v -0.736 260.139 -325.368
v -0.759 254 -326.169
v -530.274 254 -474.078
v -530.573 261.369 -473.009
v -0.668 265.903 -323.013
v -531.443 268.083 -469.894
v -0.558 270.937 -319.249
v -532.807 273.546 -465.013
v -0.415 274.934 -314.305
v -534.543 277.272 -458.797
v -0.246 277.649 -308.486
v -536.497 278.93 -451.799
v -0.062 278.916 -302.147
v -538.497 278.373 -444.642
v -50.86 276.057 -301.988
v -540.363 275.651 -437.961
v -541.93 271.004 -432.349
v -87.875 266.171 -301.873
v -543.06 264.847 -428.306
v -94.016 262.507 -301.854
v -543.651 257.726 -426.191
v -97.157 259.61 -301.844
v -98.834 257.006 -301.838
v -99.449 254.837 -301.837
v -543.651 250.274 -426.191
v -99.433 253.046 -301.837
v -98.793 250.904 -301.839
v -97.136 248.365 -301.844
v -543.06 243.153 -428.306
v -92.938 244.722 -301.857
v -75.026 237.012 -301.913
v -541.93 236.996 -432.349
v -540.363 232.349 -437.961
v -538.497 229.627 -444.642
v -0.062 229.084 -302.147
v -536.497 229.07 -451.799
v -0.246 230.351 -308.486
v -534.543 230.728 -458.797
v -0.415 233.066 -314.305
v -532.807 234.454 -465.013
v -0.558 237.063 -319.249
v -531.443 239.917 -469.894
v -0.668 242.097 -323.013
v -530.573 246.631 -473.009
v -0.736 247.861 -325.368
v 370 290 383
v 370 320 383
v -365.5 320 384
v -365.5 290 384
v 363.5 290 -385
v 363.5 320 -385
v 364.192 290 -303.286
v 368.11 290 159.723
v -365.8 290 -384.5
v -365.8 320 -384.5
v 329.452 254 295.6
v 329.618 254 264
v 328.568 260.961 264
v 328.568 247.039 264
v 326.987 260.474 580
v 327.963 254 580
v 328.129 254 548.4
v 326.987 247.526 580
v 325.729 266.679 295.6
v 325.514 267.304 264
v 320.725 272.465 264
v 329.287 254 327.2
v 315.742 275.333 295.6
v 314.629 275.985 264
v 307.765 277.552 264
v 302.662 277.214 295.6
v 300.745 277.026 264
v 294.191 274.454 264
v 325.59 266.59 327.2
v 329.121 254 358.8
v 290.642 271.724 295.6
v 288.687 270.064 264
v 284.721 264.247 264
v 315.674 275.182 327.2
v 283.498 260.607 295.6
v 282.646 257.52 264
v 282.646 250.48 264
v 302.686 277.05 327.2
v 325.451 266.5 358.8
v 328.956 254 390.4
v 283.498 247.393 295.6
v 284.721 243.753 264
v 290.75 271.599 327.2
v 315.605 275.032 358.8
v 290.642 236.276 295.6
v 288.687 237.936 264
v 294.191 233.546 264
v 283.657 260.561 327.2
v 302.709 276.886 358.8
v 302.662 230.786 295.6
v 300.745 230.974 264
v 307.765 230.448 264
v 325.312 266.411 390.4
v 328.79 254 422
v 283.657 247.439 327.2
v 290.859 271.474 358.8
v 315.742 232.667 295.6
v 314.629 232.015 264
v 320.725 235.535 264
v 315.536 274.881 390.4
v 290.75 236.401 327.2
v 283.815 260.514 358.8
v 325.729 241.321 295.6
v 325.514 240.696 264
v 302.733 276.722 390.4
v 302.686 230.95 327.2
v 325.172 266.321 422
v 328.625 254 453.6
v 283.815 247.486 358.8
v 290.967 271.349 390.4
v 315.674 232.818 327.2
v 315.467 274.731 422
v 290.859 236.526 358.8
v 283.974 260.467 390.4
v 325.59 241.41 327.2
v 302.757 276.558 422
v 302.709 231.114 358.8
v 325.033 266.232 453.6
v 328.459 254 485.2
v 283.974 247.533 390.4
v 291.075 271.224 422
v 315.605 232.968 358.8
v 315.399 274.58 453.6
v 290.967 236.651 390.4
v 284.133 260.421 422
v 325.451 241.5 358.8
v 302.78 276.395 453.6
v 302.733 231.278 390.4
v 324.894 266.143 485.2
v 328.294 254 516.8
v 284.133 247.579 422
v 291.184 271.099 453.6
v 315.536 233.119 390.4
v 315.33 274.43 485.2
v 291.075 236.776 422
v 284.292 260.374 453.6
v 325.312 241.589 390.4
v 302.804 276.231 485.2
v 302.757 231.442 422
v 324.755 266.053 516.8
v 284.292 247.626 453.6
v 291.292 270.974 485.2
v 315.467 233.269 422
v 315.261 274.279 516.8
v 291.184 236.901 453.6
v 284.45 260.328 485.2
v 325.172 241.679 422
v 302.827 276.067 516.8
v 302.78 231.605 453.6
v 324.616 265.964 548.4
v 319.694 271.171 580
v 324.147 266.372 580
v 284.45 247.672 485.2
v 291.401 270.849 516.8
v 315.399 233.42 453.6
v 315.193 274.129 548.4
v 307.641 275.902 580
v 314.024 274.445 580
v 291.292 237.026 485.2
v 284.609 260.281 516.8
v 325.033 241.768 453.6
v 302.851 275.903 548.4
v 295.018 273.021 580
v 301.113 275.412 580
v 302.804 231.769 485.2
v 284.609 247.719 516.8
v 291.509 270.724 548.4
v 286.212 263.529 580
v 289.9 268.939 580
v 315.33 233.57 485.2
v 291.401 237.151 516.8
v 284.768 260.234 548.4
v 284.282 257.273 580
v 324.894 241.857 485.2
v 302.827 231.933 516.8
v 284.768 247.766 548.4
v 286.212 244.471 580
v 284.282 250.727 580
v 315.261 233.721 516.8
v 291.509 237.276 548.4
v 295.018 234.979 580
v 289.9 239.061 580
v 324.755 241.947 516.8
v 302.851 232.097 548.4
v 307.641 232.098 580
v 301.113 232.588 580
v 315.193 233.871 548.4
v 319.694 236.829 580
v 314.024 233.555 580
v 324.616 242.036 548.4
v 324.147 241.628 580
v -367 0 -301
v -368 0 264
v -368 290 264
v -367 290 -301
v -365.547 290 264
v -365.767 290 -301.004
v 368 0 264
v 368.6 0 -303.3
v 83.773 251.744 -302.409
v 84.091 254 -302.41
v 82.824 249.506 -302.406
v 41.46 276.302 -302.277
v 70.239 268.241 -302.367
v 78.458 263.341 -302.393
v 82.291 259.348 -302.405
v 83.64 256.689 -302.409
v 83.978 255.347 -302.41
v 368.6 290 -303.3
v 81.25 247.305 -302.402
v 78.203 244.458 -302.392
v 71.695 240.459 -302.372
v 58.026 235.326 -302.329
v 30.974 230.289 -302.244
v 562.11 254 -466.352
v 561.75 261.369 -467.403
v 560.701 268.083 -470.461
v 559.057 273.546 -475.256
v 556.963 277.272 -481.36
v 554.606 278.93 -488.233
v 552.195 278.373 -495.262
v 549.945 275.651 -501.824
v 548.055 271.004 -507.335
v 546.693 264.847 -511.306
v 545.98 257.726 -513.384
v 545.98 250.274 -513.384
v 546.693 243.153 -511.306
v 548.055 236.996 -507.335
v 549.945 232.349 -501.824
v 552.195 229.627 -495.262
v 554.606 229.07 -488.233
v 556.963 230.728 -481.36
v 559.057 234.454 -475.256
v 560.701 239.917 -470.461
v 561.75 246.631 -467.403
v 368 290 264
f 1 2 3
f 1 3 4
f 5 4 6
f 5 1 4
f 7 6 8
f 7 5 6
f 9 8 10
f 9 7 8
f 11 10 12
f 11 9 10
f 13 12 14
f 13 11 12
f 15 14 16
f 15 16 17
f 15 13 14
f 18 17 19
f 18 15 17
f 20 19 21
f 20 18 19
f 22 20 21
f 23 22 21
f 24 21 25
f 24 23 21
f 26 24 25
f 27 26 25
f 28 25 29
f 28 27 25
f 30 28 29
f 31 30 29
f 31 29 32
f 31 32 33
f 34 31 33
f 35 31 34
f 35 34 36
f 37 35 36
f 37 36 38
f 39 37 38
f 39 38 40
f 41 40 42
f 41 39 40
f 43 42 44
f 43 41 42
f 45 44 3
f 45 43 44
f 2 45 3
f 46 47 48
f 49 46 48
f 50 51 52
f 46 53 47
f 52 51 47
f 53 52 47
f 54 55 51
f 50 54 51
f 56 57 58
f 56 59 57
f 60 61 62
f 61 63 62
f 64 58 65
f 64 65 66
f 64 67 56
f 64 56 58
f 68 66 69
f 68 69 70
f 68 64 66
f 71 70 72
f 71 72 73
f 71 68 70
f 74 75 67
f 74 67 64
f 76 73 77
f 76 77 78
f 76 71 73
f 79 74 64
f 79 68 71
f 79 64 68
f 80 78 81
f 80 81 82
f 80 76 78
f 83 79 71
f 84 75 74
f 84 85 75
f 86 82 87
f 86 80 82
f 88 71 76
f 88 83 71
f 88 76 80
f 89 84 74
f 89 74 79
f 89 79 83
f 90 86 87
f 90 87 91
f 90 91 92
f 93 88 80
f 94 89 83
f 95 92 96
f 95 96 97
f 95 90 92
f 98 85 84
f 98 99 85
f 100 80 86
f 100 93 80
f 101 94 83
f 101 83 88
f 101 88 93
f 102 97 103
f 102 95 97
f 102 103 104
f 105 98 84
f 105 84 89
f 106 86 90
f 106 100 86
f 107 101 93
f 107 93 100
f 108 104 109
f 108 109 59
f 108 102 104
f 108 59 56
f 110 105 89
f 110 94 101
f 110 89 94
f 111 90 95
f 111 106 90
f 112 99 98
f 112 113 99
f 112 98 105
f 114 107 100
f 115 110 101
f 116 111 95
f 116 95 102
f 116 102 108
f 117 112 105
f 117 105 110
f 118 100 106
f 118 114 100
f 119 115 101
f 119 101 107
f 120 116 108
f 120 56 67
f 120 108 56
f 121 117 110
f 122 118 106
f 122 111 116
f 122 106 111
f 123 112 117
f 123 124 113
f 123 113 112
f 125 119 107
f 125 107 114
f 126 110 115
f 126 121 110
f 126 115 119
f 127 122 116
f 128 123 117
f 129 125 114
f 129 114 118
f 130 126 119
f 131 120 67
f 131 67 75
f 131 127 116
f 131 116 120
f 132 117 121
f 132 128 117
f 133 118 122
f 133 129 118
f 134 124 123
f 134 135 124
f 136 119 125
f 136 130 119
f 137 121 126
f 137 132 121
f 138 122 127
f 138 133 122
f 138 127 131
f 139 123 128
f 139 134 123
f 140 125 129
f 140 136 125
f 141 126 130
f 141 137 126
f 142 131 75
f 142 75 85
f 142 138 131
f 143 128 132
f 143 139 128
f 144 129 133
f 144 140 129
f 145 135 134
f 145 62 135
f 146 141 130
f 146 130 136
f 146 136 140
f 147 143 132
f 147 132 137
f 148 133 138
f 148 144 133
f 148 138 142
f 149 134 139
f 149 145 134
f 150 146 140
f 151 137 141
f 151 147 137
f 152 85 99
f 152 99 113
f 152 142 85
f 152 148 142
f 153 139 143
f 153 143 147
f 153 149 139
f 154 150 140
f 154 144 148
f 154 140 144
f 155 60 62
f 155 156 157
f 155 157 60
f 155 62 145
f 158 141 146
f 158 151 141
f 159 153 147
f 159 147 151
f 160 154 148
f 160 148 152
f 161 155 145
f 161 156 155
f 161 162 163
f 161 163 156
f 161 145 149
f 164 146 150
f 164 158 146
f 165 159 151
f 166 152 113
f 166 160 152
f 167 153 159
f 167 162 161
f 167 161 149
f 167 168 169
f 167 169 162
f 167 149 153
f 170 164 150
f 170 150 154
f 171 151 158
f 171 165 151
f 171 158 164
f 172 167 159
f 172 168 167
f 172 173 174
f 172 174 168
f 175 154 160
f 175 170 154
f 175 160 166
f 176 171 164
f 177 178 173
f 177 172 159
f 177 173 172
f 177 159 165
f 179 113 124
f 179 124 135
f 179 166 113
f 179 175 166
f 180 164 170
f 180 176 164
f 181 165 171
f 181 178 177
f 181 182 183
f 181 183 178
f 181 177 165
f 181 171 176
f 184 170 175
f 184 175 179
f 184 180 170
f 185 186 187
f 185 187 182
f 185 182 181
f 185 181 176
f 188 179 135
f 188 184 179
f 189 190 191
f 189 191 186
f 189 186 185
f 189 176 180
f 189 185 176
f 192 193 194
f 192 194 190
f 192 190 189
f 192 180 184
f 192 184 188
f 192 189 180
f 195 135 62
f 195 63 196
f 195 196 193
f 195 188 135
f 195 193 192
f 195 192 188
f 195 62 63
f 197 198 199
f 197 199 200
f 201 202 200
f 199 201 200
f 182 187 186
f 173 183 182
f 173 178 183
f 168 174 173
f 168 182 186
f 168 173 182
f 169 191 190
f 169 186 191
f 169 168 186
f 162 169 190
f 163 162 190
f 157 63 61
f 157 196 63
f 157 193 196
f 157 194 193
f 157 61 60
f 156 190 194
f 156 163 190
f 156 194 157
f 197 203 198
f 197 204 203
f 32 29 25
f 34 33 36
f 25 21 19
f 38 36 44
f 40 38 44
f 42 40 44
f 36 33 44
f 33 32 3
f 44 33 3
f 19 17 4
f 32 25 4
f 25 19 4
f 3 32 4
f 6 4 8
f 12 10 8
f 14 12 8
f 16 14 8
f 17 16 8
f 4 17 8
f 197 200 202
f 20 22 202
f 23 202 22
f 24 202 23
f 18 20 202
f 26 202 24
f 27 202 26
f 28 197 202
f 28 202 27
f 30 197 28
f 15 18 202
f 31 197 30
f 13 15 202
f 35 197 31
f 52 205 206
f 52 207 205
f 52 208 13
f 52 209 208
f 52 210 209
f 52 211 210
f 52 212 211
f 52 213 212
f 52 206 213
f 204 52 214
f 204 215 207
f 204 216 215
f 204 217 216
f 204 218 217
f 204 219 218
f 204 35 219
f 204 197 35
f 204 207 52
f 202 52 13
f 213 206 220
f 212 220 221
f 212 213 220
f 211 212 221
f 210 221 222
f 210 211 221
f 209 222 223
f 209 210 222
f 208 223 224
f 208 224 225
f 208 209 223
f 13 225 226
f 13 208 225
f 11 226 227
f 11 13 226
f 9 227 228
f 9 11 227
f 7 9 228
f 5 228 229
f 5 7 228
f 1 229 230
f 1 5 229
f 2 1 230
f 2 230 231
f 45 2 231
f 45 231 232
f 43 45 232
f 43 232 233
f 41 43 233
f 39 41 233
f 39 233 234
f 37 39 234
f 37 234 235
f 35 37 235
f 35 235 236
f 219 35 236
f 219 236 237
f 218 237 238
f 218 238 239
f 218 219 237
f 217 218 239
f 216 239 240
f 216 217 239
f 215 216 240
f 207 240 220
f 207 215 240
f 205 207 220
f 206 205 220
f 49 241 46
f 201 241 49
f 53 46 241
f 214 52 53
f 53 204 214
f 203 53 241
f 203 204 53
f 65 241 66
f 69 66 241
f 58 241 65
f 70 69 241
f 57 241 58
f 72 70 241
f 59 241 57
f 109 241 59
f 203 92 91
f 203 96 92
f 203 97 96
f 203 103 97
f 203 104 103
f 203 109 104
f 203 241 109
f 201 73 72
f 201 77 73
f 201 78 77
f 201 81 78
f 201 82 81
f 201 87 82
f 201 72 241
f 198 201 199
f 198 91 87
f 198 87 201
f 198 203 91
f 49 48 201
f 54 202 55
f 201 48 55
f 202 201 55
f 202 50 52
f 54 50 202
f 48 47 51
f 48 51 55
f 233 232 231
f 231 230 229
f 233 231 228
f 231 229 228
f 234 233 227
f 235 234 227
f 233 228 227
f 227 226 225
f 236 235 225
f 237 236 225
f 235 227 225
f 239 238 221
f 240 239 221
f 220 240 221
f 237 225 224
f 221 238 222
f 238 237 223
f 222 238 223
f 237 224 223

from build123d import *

# Parameters (mm, degrees)
EXTRUDE_1_DEPTH     = 320
EXTRUDE_2_DEPTH     = 30
CUT_EXTRUDE_1_DEPTH = 30
SKETCH_4_R          = 25
EXTRUDE_3_DEPTH     = 580
EXTRUDE_3_TAPER     = 0.3
SKETCH_8_R          = 25
EXTRUDE_4_DEPTH     = 557.556275
SKETCH_9_R          = 25
EXTRUDE_5_DEPTH     = 585.675678


with BuildPart() as part:
    # 草图1 → 凸台-拉伸1 (new body)
    with BuildSketch(Plane(origin=(0, 0, 0), x_dir=(1, 0, 0), z_dir=(0, 1, 0))):
        Polygon((368, -264), (-368, -264), (-367, 301), (368.6, 303.3), align=None)
    extrude(amount=EXTRUDE_1_DEPTH)

    # 草图2 → 凸台-拉伸2 (add)
    with BuildSketch(Plane(origin=(0, 320, 0), x_dir=(1, 0, 0), z_dir=(0, 1, 0))):
        Polygon((363.5, 385), (370, -383), (-365.5, -384), (-365.8, 384.5), align=None)
    extrude(amount=-EXTRUDE_2_DEPTH)

    # 草图3 → 切除-拉伸1 (cut)
    with BuildSketch(Plane(origin=(0, 320, 0), x_dir=(1, 0, 0), z_dir=(0, 1, 0))):
        Polygon((364.191588014, 303.286216221), (368.110287471, -159.723196528), (368.6, 303.3), align=None)
        Polygon((-365.767405538, 301.003853952), (-365.546844502, -264), (-368, -264), (-367, 301), align=None)
    extrude(amount=-CUT_EXTRUDE_1_DEPTH, mode=Mode.SUBTRACT)

    # 草图4 → 凸台-拉伸3 (add)
    with BuildSketch(Plane.XY):
        with Locations((306, 254)):
            Circle(SKETCH_4_R)
    extrude(amount=EXTRUDE_3_DEPTH, taper=EXTRUDE_3_TAPER)

    # 草图8 → 凸台-拉伸4 (add)
    with BuildSketch(Plane(origin=(0, 254, -300), x_dir=(0.26903113941240836, 0, -0.9631314790964218), z_dir=(0.9631314790964218, 0, 0.26903113941240836))):
        Circle(SKETCH_8_R)
    extrude(amount=-EXTRUDE_4_DEPTH)

    # 草图9 → 凸台-拉伸5 (add)
    with BuildSketch(Plane(origin=(0, 254, -300), x_dir=(0.3244116275984733, 0, 0.9459160088923908), z_dir=(-0.9459160088923909, 0, 0.3244116275984733))):
        Circle(SKETCH_9_R)
    extrude(amount=-EXTRUDE_5_DEPTH)


solid = part.part
